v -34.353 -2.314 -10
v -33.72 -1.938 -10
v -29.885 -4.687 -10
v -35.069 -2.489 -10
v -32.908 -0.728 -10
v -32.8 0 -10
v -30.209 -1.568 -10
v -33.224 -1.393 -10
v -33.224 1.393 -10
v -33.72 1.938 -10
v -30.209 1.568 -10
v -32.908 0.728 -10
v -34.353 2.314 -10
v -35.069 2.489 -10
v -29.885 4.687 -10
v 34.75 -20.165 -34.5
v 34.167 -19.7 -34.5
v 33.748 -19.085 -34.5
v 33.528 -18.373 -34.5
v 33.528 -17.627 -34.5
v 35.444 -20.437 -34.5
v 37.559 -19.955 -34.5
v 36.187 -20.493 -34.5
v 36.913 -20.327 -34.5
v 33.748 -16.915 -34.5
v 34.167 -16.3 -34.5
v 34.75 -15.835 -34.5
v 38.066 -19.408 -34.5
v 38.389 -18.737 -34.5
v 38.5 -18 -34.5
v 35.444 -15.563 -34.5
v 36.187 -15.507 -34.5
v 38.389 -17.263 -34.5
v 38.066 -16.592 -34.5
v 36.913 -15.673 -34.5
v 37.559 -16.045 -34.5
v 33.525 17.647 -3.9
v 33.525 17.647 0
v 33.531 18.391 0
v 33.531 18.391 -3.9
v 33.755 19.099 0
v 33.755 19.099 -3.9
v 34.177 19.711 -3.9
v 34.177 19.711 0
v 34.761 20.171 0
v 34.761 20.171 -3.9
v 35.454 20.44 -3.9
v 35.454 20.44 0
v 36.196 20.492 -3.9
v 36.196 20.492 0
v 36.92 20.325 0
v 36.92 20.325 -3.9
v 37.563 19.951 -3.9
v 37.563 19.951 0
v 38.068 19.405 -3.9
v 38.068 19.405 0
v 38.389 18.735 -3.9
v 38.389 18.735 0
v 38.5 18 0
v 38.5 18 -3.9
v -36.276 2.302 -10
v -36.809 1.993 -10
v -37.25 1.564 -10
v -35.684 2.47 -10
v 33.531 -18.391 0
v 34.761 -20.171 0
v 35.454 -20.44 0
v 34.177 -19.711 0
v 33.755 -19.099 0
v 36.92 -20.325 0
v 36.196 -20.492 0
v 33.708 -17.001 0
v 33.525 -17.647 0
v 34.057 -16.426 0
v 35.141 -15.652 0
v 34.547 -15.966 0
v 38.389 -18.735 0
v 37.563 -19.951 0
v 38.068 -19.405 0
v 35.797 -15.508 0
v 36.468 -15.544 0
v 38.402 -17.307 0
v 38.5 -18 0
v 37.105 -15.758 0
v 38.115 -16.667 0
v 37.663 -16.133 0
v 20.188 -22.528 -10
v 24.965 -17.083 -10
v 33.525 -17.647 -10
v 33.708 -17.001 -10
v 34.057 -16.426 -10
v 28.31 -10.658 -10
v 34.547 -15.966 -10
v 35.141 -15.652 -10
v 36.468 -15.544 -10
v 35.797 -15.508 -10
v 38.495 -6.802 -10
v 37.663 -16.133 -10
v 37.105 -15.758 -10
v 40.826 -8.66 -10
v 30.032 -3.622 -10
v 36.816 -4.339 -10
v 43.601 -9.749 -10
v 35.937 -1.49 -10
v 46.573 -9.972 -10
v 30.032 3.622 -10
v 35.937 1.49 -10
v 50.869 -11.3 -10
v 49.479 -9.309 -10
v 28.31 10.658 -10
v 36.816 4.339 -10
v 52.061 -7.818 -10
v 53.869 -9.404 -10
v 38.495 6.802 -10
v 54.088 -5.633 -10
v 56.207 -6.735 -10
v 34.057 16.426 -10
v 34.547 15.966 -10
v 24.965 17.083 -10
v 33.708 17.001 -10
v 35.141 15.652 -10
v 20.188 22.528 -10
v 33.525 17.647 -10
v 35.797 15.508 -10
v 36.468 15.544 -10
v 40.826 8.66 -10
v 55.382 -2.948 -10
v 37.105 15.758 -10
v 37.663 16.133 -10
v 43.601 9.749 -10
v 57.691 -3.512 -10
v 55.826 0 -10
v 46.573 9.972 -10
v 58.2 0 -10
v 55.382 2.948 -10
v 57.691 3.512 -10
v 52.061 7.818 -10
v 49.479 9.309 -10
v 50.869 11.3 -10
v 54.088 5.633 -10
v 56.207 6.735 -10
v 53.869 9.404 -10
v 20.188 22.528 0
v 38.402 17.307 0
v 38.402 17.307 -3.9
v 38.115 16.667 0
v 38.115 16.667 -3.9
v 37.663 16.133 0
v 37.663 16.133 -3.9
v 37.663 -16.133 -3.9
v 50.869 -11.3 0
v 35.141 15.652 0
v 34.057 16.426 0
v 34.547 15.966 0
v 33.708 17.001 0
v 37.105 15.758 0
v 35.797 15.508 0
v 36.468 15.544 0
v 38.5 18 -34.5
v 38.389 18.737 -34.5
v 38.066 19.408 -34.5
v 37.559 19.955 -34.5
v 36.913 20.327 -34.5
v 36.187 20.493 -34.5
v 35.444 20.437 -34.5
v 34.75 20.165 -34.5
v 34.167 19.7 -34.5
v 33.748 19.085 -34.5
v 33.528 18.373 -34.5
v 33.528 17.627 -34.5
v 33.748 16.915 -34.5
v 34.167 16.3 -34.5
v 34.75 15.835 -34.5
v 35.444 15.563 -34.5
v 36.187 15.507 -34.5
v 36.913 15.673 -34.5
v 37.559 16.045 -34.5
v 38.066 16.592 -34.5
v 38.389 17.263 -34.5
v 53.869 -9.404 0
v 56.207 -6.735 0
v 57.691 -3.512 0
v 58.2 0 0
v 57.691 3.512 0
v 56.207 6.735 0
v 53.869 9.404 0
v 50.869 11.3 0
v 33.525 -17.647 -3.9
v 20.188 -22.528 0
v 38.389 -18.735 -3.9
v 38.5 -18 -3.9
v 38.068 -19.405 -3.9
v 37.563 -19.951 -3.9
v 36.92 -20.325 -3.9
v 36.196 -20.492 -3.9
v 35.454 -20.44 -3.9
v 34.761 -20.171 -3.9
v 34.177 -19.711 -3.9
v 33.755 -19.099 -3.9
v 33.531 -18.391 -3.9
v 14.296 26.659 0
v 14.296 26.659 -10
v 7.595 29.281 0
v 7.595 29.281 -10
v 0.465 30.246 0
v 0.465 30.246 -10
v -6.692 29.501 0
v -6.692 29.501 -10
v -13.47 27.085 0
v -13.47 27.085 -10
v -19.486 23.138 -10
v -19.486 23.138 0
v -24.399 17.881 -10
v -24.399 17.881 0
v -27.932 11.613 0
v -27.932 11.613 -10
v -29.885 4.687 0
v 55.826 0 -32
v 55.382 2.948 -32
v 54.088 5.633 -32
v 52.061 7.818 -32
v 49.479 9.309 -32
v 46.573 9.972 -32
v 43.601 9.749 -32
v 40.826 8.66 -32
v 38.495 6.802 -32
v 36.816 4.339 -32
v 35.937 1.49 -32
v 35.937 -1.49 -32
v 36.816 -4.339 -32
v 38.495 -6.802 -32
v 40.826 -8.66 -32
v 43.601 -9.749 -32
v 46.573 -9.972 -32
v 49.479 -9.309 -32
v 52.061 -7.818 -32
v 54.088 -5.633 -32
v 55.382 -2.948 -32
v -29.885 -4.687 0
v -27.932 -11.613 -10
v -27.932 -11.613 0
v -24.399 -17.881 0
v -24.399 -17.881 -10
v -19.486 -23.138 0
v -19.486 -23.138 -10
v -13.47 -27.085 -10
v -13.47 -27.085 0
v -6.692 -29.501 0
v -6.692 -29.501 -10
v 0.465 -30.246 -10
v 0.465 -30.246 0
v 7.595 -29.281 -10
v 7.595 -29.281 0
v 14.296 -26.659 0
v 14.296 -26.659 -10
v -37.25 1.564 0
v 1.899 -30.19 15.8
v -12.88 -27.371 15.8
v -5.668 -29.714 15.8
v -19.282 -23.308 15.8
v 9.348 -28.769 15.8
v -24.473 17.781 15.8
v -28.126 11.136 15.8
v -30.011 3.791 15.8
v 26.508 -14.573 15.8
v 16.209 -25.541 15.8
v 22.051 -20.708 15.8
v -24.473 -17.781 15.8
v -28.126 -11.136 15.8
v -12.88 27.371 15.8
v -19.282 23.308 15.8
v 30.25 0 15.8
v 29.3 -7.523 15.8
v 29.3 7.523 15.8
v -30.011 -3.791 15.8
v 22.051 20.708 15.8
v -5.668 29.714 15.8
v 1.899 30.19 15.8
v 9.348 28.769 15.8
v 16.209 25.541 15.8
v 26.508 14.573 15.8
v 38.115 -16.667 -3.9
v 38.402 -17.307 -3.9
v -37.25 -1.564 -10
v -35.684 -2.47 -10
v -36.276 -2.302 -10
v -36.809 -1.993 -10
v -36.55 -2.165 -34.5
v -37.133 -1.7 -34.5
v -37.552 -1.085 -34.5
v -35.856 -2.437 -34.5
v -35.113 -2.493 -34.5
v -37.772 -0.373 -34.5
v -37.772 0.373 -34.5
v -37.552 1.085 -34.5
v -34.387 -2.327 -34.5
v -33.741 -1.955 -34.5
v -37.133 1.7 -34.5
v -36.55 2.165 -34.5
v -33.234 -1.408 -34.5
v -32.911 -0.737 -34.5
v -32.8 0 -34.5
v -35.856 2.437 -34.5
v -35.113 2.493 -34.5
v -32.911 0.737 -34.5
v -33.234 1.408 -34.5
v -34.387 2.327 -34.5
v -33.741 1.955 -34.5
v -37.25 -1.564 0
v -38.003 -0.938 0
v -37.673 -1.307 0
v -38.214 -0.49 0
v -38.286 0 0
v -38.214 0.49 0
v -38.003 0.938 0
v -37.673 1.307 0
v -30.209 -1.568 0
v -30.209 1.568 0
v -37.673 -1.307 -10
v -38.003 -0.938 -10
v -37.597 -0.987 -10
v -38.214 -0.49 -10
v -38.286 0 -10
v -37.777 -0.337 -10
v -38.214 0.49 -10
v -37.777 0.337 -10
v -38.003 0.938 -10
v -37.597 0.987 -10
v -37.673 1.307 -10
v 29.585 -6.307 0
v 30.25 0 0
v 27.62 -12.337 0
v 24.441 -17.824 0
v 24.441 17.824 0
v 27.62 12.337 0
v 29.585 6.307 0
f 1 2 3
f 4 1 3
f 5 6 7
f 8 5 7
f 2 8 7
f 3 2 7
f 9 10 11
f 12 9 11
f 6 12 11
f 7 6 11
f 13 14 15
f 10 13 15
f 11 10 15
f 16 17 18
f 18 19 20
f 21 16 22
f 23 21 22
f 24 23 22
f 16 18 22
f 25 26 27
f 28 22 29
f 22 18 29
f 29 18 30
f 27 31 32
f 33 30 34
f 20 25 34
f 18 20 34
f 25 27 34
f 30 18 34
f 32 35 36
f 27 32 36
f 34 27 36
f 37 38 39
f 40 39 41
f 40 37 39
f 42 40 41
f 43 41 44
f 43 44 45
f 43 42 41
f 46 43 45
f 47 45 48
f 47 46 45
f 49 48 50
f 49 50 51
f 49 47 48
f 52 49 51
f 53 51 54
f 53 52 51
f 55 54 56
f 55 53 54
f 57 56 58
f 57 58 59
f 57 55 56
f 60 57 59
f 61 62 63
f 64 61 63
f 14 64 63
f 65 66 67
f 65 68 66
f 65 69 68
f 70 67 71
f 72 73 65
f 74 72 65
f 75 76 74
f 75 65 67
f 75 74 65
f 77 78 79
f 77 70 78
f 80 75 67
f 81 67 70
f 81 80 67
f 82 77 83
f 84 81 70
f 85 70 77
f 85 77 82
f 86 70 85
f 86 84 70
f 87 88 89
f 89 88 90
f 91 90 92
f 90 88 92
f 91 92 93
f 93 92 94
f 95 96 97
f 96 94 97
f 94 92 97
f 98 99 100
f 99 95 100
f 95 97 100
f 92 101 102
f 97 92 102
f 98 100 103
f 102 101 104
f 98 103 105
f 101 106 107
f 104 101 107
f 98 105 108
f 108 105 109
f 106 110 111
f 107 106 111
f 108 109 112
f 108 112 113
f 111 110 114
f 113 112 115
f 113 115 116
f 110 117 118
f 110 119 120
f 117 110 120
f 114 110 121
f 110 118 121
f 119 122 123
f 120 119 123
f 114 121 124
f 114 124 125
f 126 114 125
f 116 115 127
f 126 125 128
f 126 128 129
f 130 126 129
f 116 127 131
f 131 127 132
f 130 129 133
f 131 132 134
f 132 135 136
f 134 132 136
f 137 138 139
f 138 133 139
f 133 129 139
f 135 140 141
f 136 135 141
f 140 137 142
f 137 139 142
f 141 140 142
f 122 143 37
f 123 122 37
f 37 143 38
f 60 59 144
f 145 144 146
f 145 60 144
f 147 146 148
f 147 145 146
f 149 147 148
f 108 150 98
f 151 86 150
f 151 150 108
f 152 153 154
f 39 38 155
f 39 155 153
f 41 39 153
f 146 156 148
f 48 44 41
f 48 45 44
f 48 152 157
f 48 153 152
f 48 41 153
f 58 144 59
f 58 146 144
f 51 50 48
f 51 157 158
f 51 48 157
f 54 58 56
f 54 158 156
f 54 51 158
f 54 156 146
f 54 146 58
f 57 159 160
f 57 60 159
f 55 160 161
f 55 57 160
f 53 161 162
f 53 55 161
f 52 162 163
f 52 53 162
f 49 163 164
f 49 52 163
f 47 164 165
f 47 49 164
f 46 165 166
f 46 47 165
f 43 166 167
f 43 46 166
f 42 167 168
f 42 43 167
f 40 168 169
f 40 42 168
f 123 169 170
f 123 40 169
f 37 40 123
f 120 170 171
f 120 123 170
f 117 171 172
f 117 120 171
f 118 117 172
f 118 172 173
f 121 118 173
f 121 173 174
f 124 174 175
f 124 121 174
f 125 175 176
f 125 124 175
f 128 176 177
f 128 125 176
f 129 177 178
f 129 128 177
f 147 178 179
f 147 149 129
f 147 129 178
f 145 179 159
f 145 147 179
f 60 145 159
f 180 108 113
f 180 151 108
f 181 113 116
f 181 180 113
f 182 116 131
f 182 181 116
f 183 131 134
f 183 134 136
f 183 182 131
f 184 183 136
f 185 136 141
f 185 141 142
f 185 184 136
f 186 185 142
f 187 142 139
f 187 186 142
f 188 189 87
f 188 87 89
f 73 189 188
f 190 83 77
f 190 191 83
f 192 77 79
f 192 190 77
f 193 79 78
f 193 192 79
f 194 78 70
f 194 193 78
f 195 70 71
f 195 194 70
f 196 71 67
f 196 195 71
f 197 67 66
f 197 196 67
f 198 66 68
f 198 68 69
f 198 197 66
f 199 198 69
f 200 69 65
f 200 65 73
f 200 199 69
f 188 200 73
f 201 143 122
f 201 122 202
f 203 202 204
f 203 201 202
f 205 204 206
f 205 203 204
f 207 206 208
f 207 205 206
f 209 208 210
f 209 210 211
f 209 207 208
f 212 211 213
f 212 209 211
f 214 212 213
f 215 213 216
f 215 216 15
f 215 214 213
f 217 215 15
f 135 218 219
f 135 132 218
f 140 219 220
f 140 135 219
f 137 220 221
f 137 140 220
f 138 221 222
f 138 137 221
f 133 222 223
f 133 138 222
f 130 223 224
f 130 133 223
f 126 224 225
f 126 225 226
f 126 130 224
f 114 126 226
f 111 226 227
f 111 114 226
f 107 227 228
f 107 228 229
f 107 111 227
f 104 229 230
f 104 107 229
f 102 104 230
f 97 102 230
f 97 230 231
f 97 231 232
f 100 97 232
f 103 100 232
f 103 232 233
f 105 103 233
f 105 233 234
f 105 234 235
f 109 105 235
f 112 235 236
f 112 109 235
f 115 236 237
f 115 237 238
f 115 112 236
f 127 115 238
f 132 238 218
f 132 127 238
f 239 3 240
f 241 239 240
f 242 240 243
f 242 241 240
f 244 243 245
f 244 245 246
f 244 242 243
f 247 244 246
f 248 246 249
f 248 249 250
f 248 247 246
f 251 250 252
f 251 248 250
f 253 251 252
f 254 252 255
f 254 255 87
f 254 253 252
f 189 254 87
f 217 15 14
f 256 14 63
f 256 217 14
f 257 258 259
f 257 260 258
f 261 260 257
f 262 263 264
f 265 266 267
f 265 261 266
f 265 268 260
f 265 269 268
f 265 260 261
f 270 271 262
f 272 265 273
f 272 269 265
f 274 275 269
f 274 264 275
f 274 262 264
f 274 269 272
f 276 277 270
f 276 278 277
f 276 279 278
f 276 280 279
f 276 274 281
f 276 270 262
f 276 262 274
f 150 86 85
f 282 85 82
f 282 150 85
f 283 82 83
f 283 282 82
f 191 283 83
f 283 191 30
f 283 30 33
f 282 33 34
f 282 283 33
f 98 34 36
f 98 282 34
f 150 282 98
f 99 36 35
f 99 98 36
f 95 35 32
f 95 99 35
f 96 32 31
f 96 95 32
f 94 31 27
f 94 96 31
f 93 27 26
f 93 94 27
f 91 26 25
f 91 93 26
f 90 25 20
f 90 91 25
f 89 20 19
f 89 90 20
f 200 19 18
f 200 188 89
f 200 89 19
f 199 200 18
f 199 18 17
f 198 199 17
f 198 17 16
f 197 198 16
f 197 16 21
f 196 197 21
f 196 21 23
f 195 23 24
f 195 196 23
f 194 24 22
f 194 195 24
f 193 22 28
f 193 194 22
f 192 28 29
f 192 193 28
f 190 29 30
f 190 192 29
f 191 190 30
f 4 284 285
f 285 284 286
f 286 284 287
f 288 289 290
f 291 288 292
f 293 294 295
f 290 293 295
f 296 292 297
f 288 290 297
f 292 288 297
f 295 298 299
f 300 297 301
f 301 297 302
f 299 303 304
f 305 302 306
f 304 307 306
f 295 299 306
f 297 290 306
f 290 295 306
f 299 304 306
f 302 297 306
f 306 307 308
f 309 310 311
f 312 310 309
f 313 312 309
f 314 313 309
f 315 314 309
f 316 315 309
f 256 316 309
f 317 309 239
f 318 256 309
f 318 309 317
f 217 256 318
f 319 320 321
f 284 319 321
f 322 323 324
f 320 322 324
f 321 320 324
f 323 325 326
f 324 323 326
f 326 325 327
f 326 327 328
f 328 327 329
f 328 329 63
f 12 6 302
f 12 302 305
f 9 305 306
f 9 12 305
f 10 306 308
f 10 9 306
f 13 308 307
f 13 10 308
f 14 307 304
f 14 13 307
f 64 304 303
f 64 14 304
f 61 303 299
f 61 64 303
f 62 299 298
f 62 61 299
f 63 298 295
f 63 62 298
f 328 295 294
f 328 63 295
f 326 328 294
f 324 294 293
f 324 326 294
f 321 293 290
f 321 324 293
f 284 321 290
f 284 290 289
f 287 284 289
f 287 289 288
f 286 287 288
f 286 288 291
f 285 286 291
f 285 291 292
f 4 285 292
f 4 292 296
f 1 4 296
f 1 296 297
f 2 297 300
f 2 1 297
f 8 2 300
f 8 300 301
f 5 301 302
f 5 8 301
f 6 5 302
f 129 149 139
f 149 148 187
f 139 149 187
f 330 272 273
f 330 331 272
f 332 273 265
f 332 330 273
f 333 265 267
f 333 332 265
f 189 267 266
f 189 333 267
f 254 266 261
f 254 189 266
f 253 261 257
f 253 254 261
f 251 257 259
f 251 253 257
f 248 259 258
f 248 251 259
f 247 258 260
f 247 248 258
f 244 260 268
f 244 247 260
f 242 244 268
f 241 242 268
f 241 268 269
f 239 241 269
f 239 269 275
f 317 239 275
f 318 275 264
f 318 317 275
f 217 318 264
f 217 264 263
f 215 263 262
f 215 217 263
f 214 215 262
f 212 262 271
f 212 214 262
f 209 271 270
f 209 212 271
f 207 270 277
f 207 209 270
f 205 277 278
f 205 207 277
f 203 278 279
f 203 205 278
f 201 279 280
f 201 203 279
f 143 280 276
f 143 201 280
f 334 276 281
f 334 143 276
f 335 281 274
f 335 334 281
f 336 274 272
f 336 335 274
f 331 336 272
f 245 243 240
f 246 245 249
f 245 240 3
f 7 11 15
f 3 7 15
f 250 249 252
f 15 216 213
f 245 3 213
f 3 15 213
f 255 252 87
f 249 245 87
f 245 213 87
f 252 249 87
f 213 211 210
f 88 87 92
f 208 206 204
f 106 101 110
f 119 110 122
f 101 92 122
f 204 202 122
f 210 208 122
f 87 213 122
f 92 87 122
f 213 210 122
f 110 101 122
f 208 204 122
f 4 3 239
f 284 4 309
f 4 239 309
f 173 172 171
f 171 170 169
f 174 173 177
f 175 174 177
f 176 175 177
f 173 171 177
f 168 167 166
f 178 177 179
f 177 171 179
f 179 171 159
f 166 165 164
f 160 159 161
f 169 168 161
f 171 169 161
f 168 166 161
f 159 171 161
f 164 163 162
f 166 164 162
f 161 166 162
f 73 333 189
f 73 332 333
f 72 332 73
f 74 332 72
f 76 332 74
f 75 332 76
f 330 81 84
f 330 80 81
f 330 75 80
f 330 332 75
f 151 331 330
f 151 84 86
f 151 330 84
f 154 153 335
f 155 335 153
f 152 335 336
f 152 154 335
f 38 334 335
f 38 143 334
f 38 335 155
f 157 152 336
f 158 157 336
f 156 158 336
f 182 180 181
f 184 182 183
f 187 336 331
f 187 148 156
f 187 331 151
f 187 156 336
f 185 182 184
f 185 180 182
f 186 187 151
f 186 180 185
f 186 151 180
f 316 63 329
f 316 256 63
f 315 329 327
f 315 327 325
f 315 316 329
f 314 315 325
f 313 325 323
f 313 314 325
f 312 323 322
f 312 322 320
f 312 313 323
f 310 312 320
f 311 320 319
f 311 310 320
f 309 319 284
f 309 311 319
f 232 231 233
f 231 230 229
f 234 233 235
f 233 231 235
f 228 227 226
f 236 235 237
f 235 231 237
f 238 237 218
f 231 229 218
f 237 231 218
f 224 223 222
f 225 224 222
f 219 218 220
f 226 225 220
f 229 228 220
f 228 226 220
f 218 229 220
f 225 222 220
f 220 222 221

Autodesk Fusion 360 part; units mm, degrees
sketch "Sketch1" plane through (0, 0, 0) normal (0, 0, 1) x (1, 0, 0)
  circle A0 centre (0, 0) radius 30.25
  line L0 (0, 0) -> (-35.3, 0) construction
  line L1 (0, 0) -> (36, 0) construction
  circle A1 centre (-35.3, 0) radius 2.5
  line L2 (36, 0) -> (36, -18) construction
  line L3 (36, 0) -> (36, 18) construction
  circle A2 centre (36, 18) radius 2.5
  circle A3 centre (36, -18) radius 2.5
  line L4 (36, 0) -> (58.2, 0) construction
  line L5 (-29.8847, 4.6871) -> (-37.25, 1.5644)
  line L6 (-29.8847, -4.6871) -> (-37.25, -1.5644)
  arc A4 (-37.25, 1.5644) -> (-37.25, -1.5644) centre (-36.5868, 0) ccw
  arc A5 (50.8692, -11.2997) -> (50.8692, 11.2997) centre (45.8258, 0) ccw
  line L7 (20.1876, 22.5283) -> (33.525, 17.6472)
  line L8 (37.6626, 16.133) -> (50.8692, 11.2997)
  line L9 (20.1876, -22.5283) -> (33.525, -17.6472)
  line L10 (37.6626, -16.133) -> (50.8692, -11.2997)
  circle A6 centre (45.8258, 0) radius 10
  dimension "d1" = 60.5
  dimension "d2" = 35.3
  dimension "d3" = 36
  dimension "d4" = 5
  dimension "d5" = 18
  dimension "d6" = 18
  dimension "d7" = 5
  dimension "d8" = 5
  dimension "d9" = 22.2
  dimension "d10" = 8
  dimension "d13" = 20
extrude "Extrude1" add sketch "Sketch1" along normal blind 15.8 contours A0 makes body 1
extrude "Extrude2" add sketch "Sketch1" against normal blind 32 separate body contours A6 makes body 2
extrude "Extrude3" add sketch "Sketch1" against normal blind 30.6 separate body contours A2 | A3 | A1 L5 L6 makes body 3 at (-33.8177, -2.0132, -20.4) makes body 4 at (38.4876, -17.7511, -10.2) makes body 5 at (38.4876, 18.2489, -10.2)
delete_face "DeleteFace1" 1 faces at (-35.7958, 2.181, -10.2) on bodies 3
delete_face "DeleteFace2" 1 faces at (-35.7958, -2.181, -10.2) on bodies 3
move_body "Move1" bodies 3 4 5 to x (1, 0, 0) y (0, 1, 0) z (0, 0, 1) at (0, 0, -3.9)
extrude "Extrude4" add sketch "Sketch1" against normal blind 10 contours A0 A2 A3 A5 L7 L8 L9 L10 | A0 A1 L5 L6 bodies 2 1 3 4 5
extrude "Extrude5" add 3 faces at (-34.7396, 0.6435, -3.9) (37.3366, -18.5849, -3.9) (36.7741, 18.8349, -3.9) along direction (0, 0, 1) blind 3.9 on bodies 2 bodies 2
extrude "Extrude6" add sketch "Sketch1" against normal blind 10 contours A0 bodies 2
extrude "Extrude7" add sketch "Sketch1" against normal blind 10 contours A1 A4 bodies 2
extrude "Extrude8" cut sketch "Sketch1" against normal blind 10 contours A1 L5 | A1 L6 bodies 2
